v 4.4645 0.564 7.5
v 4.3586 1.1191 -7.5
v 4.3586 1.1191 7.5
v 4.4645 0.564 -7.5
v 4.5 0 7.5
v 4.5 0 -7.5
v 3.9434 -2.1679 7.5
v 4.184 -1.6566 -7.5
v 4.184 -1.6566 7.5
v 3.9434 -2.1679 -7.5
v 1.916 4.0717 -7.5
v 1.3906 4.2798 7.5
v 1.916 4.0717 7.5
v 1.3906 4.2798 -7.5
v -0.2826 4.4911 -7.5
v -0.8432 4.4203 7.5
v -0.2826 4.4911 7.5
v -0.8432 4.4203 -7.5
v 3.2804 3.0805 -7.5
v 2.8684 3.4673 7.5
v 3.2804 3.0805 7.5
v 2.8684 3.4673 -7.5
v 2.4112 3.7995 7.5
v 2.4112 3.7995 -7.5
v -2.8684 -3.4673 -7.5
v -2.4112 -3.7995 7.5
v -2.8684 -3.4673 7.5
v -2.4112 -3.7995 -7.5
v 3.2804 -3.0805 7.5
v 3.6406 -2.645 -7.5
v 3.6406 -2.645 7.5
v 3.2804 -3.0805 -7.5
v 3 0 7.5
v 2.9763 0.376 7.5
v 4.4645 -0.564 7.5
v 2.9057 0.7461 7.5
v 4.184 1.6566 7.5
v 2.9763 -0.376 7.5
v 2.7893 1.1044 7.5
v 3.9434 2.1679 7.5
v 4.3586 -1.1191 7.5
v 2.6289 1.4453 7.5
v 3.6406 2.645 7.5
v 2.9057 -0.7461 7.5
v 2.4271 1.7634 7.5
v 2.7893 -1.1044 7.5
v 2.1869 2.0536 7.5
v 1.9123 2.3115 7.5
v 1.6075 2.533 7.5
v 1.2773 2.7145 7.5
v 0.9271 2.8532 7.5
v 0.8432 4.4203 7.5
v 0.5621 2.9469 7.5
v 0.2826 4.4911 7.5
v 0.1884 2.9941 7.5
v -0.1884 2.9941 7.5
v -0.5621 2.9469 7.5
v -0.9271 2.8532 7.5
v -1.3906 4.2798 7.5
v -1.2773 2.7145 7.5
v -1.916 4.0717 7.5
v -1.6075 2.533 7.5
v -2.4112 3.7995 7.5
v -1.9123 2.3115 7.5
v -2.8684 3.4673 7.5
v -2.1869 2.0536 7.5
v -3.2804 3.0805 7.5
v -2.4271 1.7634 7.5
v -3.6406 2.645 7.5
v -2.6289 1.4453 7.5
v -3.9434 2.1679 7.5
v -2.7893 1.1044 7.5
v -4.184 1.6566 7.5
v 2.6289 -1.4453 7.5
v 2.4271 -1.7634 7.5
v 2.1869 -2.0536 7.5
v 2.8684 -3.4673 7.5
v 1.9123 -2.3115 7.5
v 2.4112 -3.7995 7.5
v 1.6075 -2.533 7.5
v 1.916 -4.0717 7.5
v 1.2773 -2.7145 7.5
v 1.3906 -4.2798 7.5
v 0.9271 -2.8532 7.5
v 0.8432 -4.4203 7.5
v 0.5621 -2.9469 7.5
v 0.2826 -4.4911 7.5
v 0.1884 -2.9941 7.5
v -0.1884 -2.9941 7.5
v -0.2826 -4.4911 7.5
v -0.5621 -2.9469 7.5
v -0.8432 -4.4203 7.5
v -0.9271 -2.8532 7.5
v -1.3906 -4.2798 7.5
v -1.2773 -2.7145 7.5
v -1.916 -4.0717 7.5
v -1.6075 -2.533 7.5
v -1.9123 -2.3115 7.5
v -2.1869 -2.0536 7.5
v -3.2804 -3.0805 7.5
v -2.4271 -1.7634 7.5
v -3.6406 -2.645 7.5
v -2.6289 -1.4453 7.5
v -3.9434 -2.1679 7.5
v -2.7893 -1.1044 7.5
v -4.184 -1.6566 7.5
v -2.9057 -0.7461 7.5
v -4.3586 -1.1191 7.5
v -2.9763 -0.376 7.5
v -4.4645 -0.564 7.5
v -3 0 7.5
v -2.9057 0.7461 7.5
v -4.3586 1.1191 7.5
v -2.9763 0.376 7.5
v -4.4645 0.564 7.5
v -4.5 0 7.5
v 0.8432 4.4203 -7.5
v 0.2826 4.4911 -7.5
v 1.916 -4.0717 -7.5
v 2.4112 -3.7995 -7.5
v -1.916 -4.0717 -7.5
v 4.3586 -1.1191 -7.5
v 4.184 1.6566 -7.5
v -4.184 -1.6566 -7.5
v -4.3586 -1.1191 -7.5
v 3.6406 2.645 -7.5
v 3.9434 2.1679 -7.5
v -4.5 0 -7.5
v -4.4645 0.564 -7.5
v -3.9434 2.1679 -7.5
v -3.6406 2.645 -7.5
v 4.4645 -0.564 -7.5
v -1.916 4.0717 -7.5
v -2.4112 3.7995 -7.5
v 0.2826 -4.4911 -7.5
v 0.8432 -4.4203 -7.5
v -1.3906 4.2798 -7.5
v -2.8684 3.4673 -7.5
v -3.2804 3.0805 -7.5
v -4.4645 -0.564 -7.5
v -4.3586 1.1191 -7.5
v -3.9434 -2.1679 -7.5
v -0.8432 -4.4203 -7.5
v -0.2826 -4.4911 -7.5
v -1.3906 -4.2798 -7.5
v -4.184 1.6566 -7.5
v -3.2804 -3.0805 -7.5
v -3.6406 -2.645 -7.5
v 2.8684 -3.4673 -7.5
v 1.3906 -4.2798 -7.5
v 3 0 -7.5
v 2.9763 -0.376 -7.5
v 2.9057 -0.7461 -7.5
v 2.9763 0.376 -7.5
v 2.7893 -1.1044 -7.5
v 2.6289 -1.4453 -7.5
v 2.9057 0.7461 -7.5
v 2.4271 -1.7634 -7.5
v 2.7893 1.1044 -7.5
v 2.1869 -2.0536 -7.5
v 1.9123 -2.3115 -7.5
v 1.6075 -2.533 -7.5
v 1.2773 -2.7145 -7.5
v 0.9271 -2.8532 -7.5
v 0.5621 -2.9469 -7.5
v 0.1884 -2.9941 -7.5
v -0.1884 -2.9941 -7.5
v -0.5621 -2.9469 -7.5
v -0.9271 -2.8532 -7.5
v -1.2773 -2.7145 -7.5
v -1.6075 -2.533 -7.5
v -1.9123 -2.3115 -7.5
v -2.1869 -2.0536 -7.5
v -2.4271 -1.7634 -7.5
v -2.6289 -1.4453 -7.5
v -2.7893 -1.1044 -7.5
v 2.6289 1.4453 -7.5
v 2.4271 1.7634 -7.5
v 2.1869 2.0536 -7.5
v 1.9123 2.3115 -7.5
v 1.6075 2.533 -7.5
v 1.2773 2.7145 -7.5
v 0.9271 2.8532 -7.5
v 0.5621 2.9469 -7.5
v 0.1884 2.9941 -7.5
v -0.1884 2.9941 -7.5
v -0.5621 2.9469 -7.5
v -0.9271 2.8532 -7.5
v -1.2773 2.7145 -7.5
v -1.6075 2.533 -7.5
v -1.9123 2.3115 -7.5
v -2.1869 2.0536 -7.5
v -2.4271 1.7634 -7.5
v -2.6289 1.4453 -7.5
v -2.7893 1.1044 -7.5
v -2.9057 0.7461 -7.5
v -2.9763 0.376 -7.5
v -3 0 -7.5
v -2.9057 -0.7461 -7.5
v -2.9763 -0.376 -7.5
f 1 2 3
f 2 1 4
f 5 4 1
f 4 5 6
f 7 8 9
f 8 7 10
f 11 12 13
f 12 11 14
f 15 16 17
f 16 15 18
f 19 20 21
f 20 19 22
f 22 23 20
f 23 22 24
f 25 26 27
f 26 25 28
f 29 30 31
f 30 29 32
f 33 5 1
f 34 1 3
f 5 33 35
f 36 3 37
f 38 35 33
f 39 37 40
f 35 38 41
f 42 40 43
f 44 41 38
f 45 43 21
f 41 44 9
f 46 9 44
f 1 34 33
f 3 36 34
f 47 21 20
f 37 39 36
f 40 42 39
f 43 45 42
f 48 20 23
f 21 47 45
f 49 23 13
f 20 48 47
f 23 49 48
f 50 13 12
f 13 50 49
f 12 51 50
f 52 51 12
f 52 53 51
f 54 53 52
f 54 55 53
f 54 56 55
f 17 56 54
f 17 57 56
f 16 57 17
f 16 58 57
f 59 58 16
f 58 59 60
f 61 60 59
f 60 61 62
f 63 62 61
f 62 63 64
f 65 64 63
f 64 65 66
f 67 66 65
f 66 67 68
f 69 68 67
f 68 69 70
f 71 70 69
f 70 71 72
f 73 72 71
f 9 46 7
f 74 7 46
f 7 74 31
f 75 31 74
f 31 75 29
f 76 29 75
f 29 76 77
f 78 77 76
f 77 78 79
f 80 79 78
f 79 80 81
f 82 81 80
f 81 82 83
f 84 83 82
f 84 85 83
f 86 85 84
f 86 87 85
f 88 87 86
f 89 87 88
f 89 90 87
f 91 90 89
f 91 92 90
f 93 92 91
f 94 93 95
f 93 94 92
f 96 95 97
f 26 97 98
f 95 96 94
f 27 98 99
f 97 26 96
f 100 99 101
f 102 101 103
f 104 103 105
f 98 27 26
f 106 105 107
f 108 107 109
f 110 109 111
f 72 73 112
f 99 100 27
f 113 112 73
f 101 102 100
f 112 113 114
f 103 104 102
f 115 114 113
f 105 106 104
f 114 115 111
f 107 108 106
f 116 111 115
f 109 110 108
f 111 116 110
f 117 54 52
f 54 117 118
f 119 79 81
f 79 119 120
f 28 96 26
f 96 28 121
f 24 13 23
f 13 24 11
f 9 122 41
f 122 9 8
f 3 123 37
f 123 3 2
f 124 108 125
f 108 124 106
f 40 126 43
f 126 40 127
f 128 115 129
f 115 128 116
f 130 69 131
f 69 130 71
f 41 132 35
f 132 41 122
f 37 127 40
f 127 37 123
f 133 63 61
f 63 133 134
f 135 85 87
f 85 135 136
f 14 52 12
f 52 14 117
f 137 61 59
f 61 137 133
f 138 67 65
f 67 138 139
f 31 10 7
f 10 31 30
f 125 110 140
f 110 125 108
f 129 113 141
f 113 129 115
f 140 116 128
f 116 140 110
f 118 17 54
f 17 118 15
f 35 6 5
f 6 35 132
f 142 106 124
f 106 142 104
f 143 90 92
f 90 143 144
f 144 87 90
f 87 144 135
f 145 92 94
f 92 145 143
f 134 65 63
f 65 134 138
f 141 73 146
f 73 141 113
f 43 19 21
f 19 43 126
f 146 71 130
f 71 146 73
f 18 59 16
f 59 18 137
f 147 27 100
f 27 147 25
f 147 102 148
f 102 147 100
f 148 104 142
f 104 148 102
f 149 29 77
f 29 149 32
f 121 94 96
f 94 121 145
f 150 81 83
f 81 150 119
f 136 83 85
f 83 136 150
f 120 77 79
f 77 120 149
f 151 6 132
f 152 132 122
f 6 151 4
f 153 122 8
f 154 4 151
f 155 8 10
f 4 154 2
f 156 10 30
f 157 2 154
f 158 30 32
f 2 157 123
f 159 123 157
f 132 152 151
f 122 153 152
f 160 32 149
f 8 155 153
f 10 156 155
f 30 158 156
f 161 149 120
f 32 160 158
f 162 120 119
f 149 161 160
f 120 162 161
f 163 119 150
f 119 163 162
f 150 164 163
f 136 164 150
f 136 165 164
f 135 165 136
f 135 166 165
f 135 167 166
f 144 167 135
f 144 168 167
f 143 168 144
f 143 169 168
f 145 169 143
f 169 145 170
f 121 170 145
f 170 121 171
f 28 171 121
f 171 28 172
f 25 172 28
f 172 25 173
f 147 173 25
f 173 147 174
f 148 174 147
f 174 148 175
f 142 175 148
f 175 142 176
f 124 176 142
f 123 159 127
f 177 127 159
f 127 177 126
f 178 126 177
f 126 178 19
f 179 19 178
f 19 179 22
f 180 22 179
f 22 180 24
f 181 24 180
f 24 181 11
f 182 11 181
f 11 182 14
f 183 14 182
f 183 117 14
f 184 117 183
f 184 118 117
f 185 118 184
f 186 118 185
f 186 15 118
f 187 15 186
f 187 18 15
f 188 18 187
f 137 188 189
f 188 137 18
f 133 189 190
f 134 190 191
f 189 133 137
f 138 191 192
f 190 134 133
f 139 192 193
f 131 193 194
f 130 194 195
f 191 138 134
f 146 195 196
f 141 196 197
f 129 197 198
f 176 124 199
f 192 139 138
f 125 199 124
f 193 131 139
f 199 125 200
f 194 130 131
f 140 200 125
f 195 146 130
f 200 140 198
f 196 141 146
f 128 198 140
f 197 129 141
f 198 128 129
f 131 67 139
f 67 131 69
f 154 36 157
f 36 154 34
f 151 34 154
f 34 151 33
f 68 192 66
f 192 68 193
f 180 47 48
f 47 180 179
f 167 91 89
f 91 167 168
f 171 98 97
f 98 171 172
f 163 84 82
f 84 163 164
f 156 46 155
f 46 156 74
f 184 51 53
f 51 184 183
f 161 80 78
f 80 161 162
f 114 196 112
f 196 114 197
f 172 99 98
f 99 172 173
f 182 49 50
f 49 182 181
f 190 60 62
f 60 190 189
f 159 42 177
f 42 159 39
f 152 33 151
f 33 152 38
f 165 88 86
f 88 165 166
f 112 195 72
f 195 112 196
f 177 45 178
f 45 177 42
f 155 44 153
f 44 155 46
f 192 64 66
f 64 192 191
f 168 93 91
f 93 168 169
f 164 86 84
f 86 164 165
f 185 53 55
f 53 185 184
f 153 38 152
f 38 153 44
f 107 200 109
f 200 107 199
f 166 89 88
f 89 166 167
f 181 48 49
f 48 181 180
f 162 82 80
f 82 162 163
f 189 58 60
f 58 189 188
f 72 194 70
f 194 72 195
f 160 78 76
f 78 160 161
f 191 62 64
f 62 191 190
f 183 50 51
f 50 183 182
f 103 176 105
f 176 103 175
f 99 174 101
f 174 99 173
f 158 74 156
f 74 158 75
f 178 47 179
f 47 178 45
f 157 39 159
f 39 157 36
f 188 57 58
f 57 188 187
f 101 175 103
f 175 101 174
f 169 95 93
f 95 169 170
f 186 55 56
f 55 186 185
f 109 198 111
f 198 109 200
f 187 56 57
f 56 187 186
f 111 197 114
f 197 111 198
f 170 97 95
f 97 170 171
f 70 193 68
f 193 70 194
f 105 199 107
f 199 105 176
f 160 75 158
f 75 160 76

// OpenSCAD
$fn = 50;


difference() {
	union() {
		translate(v = [0, 0, -7.5000000000]) {
			cylinder(h = 15, r = 4.5000000000);
		}
	}
	union() {
		translate(v = [0, 0, -100.0000000000]) {
			cylinder(h = 200, r = 3.0000000000);
		}
	}
}
